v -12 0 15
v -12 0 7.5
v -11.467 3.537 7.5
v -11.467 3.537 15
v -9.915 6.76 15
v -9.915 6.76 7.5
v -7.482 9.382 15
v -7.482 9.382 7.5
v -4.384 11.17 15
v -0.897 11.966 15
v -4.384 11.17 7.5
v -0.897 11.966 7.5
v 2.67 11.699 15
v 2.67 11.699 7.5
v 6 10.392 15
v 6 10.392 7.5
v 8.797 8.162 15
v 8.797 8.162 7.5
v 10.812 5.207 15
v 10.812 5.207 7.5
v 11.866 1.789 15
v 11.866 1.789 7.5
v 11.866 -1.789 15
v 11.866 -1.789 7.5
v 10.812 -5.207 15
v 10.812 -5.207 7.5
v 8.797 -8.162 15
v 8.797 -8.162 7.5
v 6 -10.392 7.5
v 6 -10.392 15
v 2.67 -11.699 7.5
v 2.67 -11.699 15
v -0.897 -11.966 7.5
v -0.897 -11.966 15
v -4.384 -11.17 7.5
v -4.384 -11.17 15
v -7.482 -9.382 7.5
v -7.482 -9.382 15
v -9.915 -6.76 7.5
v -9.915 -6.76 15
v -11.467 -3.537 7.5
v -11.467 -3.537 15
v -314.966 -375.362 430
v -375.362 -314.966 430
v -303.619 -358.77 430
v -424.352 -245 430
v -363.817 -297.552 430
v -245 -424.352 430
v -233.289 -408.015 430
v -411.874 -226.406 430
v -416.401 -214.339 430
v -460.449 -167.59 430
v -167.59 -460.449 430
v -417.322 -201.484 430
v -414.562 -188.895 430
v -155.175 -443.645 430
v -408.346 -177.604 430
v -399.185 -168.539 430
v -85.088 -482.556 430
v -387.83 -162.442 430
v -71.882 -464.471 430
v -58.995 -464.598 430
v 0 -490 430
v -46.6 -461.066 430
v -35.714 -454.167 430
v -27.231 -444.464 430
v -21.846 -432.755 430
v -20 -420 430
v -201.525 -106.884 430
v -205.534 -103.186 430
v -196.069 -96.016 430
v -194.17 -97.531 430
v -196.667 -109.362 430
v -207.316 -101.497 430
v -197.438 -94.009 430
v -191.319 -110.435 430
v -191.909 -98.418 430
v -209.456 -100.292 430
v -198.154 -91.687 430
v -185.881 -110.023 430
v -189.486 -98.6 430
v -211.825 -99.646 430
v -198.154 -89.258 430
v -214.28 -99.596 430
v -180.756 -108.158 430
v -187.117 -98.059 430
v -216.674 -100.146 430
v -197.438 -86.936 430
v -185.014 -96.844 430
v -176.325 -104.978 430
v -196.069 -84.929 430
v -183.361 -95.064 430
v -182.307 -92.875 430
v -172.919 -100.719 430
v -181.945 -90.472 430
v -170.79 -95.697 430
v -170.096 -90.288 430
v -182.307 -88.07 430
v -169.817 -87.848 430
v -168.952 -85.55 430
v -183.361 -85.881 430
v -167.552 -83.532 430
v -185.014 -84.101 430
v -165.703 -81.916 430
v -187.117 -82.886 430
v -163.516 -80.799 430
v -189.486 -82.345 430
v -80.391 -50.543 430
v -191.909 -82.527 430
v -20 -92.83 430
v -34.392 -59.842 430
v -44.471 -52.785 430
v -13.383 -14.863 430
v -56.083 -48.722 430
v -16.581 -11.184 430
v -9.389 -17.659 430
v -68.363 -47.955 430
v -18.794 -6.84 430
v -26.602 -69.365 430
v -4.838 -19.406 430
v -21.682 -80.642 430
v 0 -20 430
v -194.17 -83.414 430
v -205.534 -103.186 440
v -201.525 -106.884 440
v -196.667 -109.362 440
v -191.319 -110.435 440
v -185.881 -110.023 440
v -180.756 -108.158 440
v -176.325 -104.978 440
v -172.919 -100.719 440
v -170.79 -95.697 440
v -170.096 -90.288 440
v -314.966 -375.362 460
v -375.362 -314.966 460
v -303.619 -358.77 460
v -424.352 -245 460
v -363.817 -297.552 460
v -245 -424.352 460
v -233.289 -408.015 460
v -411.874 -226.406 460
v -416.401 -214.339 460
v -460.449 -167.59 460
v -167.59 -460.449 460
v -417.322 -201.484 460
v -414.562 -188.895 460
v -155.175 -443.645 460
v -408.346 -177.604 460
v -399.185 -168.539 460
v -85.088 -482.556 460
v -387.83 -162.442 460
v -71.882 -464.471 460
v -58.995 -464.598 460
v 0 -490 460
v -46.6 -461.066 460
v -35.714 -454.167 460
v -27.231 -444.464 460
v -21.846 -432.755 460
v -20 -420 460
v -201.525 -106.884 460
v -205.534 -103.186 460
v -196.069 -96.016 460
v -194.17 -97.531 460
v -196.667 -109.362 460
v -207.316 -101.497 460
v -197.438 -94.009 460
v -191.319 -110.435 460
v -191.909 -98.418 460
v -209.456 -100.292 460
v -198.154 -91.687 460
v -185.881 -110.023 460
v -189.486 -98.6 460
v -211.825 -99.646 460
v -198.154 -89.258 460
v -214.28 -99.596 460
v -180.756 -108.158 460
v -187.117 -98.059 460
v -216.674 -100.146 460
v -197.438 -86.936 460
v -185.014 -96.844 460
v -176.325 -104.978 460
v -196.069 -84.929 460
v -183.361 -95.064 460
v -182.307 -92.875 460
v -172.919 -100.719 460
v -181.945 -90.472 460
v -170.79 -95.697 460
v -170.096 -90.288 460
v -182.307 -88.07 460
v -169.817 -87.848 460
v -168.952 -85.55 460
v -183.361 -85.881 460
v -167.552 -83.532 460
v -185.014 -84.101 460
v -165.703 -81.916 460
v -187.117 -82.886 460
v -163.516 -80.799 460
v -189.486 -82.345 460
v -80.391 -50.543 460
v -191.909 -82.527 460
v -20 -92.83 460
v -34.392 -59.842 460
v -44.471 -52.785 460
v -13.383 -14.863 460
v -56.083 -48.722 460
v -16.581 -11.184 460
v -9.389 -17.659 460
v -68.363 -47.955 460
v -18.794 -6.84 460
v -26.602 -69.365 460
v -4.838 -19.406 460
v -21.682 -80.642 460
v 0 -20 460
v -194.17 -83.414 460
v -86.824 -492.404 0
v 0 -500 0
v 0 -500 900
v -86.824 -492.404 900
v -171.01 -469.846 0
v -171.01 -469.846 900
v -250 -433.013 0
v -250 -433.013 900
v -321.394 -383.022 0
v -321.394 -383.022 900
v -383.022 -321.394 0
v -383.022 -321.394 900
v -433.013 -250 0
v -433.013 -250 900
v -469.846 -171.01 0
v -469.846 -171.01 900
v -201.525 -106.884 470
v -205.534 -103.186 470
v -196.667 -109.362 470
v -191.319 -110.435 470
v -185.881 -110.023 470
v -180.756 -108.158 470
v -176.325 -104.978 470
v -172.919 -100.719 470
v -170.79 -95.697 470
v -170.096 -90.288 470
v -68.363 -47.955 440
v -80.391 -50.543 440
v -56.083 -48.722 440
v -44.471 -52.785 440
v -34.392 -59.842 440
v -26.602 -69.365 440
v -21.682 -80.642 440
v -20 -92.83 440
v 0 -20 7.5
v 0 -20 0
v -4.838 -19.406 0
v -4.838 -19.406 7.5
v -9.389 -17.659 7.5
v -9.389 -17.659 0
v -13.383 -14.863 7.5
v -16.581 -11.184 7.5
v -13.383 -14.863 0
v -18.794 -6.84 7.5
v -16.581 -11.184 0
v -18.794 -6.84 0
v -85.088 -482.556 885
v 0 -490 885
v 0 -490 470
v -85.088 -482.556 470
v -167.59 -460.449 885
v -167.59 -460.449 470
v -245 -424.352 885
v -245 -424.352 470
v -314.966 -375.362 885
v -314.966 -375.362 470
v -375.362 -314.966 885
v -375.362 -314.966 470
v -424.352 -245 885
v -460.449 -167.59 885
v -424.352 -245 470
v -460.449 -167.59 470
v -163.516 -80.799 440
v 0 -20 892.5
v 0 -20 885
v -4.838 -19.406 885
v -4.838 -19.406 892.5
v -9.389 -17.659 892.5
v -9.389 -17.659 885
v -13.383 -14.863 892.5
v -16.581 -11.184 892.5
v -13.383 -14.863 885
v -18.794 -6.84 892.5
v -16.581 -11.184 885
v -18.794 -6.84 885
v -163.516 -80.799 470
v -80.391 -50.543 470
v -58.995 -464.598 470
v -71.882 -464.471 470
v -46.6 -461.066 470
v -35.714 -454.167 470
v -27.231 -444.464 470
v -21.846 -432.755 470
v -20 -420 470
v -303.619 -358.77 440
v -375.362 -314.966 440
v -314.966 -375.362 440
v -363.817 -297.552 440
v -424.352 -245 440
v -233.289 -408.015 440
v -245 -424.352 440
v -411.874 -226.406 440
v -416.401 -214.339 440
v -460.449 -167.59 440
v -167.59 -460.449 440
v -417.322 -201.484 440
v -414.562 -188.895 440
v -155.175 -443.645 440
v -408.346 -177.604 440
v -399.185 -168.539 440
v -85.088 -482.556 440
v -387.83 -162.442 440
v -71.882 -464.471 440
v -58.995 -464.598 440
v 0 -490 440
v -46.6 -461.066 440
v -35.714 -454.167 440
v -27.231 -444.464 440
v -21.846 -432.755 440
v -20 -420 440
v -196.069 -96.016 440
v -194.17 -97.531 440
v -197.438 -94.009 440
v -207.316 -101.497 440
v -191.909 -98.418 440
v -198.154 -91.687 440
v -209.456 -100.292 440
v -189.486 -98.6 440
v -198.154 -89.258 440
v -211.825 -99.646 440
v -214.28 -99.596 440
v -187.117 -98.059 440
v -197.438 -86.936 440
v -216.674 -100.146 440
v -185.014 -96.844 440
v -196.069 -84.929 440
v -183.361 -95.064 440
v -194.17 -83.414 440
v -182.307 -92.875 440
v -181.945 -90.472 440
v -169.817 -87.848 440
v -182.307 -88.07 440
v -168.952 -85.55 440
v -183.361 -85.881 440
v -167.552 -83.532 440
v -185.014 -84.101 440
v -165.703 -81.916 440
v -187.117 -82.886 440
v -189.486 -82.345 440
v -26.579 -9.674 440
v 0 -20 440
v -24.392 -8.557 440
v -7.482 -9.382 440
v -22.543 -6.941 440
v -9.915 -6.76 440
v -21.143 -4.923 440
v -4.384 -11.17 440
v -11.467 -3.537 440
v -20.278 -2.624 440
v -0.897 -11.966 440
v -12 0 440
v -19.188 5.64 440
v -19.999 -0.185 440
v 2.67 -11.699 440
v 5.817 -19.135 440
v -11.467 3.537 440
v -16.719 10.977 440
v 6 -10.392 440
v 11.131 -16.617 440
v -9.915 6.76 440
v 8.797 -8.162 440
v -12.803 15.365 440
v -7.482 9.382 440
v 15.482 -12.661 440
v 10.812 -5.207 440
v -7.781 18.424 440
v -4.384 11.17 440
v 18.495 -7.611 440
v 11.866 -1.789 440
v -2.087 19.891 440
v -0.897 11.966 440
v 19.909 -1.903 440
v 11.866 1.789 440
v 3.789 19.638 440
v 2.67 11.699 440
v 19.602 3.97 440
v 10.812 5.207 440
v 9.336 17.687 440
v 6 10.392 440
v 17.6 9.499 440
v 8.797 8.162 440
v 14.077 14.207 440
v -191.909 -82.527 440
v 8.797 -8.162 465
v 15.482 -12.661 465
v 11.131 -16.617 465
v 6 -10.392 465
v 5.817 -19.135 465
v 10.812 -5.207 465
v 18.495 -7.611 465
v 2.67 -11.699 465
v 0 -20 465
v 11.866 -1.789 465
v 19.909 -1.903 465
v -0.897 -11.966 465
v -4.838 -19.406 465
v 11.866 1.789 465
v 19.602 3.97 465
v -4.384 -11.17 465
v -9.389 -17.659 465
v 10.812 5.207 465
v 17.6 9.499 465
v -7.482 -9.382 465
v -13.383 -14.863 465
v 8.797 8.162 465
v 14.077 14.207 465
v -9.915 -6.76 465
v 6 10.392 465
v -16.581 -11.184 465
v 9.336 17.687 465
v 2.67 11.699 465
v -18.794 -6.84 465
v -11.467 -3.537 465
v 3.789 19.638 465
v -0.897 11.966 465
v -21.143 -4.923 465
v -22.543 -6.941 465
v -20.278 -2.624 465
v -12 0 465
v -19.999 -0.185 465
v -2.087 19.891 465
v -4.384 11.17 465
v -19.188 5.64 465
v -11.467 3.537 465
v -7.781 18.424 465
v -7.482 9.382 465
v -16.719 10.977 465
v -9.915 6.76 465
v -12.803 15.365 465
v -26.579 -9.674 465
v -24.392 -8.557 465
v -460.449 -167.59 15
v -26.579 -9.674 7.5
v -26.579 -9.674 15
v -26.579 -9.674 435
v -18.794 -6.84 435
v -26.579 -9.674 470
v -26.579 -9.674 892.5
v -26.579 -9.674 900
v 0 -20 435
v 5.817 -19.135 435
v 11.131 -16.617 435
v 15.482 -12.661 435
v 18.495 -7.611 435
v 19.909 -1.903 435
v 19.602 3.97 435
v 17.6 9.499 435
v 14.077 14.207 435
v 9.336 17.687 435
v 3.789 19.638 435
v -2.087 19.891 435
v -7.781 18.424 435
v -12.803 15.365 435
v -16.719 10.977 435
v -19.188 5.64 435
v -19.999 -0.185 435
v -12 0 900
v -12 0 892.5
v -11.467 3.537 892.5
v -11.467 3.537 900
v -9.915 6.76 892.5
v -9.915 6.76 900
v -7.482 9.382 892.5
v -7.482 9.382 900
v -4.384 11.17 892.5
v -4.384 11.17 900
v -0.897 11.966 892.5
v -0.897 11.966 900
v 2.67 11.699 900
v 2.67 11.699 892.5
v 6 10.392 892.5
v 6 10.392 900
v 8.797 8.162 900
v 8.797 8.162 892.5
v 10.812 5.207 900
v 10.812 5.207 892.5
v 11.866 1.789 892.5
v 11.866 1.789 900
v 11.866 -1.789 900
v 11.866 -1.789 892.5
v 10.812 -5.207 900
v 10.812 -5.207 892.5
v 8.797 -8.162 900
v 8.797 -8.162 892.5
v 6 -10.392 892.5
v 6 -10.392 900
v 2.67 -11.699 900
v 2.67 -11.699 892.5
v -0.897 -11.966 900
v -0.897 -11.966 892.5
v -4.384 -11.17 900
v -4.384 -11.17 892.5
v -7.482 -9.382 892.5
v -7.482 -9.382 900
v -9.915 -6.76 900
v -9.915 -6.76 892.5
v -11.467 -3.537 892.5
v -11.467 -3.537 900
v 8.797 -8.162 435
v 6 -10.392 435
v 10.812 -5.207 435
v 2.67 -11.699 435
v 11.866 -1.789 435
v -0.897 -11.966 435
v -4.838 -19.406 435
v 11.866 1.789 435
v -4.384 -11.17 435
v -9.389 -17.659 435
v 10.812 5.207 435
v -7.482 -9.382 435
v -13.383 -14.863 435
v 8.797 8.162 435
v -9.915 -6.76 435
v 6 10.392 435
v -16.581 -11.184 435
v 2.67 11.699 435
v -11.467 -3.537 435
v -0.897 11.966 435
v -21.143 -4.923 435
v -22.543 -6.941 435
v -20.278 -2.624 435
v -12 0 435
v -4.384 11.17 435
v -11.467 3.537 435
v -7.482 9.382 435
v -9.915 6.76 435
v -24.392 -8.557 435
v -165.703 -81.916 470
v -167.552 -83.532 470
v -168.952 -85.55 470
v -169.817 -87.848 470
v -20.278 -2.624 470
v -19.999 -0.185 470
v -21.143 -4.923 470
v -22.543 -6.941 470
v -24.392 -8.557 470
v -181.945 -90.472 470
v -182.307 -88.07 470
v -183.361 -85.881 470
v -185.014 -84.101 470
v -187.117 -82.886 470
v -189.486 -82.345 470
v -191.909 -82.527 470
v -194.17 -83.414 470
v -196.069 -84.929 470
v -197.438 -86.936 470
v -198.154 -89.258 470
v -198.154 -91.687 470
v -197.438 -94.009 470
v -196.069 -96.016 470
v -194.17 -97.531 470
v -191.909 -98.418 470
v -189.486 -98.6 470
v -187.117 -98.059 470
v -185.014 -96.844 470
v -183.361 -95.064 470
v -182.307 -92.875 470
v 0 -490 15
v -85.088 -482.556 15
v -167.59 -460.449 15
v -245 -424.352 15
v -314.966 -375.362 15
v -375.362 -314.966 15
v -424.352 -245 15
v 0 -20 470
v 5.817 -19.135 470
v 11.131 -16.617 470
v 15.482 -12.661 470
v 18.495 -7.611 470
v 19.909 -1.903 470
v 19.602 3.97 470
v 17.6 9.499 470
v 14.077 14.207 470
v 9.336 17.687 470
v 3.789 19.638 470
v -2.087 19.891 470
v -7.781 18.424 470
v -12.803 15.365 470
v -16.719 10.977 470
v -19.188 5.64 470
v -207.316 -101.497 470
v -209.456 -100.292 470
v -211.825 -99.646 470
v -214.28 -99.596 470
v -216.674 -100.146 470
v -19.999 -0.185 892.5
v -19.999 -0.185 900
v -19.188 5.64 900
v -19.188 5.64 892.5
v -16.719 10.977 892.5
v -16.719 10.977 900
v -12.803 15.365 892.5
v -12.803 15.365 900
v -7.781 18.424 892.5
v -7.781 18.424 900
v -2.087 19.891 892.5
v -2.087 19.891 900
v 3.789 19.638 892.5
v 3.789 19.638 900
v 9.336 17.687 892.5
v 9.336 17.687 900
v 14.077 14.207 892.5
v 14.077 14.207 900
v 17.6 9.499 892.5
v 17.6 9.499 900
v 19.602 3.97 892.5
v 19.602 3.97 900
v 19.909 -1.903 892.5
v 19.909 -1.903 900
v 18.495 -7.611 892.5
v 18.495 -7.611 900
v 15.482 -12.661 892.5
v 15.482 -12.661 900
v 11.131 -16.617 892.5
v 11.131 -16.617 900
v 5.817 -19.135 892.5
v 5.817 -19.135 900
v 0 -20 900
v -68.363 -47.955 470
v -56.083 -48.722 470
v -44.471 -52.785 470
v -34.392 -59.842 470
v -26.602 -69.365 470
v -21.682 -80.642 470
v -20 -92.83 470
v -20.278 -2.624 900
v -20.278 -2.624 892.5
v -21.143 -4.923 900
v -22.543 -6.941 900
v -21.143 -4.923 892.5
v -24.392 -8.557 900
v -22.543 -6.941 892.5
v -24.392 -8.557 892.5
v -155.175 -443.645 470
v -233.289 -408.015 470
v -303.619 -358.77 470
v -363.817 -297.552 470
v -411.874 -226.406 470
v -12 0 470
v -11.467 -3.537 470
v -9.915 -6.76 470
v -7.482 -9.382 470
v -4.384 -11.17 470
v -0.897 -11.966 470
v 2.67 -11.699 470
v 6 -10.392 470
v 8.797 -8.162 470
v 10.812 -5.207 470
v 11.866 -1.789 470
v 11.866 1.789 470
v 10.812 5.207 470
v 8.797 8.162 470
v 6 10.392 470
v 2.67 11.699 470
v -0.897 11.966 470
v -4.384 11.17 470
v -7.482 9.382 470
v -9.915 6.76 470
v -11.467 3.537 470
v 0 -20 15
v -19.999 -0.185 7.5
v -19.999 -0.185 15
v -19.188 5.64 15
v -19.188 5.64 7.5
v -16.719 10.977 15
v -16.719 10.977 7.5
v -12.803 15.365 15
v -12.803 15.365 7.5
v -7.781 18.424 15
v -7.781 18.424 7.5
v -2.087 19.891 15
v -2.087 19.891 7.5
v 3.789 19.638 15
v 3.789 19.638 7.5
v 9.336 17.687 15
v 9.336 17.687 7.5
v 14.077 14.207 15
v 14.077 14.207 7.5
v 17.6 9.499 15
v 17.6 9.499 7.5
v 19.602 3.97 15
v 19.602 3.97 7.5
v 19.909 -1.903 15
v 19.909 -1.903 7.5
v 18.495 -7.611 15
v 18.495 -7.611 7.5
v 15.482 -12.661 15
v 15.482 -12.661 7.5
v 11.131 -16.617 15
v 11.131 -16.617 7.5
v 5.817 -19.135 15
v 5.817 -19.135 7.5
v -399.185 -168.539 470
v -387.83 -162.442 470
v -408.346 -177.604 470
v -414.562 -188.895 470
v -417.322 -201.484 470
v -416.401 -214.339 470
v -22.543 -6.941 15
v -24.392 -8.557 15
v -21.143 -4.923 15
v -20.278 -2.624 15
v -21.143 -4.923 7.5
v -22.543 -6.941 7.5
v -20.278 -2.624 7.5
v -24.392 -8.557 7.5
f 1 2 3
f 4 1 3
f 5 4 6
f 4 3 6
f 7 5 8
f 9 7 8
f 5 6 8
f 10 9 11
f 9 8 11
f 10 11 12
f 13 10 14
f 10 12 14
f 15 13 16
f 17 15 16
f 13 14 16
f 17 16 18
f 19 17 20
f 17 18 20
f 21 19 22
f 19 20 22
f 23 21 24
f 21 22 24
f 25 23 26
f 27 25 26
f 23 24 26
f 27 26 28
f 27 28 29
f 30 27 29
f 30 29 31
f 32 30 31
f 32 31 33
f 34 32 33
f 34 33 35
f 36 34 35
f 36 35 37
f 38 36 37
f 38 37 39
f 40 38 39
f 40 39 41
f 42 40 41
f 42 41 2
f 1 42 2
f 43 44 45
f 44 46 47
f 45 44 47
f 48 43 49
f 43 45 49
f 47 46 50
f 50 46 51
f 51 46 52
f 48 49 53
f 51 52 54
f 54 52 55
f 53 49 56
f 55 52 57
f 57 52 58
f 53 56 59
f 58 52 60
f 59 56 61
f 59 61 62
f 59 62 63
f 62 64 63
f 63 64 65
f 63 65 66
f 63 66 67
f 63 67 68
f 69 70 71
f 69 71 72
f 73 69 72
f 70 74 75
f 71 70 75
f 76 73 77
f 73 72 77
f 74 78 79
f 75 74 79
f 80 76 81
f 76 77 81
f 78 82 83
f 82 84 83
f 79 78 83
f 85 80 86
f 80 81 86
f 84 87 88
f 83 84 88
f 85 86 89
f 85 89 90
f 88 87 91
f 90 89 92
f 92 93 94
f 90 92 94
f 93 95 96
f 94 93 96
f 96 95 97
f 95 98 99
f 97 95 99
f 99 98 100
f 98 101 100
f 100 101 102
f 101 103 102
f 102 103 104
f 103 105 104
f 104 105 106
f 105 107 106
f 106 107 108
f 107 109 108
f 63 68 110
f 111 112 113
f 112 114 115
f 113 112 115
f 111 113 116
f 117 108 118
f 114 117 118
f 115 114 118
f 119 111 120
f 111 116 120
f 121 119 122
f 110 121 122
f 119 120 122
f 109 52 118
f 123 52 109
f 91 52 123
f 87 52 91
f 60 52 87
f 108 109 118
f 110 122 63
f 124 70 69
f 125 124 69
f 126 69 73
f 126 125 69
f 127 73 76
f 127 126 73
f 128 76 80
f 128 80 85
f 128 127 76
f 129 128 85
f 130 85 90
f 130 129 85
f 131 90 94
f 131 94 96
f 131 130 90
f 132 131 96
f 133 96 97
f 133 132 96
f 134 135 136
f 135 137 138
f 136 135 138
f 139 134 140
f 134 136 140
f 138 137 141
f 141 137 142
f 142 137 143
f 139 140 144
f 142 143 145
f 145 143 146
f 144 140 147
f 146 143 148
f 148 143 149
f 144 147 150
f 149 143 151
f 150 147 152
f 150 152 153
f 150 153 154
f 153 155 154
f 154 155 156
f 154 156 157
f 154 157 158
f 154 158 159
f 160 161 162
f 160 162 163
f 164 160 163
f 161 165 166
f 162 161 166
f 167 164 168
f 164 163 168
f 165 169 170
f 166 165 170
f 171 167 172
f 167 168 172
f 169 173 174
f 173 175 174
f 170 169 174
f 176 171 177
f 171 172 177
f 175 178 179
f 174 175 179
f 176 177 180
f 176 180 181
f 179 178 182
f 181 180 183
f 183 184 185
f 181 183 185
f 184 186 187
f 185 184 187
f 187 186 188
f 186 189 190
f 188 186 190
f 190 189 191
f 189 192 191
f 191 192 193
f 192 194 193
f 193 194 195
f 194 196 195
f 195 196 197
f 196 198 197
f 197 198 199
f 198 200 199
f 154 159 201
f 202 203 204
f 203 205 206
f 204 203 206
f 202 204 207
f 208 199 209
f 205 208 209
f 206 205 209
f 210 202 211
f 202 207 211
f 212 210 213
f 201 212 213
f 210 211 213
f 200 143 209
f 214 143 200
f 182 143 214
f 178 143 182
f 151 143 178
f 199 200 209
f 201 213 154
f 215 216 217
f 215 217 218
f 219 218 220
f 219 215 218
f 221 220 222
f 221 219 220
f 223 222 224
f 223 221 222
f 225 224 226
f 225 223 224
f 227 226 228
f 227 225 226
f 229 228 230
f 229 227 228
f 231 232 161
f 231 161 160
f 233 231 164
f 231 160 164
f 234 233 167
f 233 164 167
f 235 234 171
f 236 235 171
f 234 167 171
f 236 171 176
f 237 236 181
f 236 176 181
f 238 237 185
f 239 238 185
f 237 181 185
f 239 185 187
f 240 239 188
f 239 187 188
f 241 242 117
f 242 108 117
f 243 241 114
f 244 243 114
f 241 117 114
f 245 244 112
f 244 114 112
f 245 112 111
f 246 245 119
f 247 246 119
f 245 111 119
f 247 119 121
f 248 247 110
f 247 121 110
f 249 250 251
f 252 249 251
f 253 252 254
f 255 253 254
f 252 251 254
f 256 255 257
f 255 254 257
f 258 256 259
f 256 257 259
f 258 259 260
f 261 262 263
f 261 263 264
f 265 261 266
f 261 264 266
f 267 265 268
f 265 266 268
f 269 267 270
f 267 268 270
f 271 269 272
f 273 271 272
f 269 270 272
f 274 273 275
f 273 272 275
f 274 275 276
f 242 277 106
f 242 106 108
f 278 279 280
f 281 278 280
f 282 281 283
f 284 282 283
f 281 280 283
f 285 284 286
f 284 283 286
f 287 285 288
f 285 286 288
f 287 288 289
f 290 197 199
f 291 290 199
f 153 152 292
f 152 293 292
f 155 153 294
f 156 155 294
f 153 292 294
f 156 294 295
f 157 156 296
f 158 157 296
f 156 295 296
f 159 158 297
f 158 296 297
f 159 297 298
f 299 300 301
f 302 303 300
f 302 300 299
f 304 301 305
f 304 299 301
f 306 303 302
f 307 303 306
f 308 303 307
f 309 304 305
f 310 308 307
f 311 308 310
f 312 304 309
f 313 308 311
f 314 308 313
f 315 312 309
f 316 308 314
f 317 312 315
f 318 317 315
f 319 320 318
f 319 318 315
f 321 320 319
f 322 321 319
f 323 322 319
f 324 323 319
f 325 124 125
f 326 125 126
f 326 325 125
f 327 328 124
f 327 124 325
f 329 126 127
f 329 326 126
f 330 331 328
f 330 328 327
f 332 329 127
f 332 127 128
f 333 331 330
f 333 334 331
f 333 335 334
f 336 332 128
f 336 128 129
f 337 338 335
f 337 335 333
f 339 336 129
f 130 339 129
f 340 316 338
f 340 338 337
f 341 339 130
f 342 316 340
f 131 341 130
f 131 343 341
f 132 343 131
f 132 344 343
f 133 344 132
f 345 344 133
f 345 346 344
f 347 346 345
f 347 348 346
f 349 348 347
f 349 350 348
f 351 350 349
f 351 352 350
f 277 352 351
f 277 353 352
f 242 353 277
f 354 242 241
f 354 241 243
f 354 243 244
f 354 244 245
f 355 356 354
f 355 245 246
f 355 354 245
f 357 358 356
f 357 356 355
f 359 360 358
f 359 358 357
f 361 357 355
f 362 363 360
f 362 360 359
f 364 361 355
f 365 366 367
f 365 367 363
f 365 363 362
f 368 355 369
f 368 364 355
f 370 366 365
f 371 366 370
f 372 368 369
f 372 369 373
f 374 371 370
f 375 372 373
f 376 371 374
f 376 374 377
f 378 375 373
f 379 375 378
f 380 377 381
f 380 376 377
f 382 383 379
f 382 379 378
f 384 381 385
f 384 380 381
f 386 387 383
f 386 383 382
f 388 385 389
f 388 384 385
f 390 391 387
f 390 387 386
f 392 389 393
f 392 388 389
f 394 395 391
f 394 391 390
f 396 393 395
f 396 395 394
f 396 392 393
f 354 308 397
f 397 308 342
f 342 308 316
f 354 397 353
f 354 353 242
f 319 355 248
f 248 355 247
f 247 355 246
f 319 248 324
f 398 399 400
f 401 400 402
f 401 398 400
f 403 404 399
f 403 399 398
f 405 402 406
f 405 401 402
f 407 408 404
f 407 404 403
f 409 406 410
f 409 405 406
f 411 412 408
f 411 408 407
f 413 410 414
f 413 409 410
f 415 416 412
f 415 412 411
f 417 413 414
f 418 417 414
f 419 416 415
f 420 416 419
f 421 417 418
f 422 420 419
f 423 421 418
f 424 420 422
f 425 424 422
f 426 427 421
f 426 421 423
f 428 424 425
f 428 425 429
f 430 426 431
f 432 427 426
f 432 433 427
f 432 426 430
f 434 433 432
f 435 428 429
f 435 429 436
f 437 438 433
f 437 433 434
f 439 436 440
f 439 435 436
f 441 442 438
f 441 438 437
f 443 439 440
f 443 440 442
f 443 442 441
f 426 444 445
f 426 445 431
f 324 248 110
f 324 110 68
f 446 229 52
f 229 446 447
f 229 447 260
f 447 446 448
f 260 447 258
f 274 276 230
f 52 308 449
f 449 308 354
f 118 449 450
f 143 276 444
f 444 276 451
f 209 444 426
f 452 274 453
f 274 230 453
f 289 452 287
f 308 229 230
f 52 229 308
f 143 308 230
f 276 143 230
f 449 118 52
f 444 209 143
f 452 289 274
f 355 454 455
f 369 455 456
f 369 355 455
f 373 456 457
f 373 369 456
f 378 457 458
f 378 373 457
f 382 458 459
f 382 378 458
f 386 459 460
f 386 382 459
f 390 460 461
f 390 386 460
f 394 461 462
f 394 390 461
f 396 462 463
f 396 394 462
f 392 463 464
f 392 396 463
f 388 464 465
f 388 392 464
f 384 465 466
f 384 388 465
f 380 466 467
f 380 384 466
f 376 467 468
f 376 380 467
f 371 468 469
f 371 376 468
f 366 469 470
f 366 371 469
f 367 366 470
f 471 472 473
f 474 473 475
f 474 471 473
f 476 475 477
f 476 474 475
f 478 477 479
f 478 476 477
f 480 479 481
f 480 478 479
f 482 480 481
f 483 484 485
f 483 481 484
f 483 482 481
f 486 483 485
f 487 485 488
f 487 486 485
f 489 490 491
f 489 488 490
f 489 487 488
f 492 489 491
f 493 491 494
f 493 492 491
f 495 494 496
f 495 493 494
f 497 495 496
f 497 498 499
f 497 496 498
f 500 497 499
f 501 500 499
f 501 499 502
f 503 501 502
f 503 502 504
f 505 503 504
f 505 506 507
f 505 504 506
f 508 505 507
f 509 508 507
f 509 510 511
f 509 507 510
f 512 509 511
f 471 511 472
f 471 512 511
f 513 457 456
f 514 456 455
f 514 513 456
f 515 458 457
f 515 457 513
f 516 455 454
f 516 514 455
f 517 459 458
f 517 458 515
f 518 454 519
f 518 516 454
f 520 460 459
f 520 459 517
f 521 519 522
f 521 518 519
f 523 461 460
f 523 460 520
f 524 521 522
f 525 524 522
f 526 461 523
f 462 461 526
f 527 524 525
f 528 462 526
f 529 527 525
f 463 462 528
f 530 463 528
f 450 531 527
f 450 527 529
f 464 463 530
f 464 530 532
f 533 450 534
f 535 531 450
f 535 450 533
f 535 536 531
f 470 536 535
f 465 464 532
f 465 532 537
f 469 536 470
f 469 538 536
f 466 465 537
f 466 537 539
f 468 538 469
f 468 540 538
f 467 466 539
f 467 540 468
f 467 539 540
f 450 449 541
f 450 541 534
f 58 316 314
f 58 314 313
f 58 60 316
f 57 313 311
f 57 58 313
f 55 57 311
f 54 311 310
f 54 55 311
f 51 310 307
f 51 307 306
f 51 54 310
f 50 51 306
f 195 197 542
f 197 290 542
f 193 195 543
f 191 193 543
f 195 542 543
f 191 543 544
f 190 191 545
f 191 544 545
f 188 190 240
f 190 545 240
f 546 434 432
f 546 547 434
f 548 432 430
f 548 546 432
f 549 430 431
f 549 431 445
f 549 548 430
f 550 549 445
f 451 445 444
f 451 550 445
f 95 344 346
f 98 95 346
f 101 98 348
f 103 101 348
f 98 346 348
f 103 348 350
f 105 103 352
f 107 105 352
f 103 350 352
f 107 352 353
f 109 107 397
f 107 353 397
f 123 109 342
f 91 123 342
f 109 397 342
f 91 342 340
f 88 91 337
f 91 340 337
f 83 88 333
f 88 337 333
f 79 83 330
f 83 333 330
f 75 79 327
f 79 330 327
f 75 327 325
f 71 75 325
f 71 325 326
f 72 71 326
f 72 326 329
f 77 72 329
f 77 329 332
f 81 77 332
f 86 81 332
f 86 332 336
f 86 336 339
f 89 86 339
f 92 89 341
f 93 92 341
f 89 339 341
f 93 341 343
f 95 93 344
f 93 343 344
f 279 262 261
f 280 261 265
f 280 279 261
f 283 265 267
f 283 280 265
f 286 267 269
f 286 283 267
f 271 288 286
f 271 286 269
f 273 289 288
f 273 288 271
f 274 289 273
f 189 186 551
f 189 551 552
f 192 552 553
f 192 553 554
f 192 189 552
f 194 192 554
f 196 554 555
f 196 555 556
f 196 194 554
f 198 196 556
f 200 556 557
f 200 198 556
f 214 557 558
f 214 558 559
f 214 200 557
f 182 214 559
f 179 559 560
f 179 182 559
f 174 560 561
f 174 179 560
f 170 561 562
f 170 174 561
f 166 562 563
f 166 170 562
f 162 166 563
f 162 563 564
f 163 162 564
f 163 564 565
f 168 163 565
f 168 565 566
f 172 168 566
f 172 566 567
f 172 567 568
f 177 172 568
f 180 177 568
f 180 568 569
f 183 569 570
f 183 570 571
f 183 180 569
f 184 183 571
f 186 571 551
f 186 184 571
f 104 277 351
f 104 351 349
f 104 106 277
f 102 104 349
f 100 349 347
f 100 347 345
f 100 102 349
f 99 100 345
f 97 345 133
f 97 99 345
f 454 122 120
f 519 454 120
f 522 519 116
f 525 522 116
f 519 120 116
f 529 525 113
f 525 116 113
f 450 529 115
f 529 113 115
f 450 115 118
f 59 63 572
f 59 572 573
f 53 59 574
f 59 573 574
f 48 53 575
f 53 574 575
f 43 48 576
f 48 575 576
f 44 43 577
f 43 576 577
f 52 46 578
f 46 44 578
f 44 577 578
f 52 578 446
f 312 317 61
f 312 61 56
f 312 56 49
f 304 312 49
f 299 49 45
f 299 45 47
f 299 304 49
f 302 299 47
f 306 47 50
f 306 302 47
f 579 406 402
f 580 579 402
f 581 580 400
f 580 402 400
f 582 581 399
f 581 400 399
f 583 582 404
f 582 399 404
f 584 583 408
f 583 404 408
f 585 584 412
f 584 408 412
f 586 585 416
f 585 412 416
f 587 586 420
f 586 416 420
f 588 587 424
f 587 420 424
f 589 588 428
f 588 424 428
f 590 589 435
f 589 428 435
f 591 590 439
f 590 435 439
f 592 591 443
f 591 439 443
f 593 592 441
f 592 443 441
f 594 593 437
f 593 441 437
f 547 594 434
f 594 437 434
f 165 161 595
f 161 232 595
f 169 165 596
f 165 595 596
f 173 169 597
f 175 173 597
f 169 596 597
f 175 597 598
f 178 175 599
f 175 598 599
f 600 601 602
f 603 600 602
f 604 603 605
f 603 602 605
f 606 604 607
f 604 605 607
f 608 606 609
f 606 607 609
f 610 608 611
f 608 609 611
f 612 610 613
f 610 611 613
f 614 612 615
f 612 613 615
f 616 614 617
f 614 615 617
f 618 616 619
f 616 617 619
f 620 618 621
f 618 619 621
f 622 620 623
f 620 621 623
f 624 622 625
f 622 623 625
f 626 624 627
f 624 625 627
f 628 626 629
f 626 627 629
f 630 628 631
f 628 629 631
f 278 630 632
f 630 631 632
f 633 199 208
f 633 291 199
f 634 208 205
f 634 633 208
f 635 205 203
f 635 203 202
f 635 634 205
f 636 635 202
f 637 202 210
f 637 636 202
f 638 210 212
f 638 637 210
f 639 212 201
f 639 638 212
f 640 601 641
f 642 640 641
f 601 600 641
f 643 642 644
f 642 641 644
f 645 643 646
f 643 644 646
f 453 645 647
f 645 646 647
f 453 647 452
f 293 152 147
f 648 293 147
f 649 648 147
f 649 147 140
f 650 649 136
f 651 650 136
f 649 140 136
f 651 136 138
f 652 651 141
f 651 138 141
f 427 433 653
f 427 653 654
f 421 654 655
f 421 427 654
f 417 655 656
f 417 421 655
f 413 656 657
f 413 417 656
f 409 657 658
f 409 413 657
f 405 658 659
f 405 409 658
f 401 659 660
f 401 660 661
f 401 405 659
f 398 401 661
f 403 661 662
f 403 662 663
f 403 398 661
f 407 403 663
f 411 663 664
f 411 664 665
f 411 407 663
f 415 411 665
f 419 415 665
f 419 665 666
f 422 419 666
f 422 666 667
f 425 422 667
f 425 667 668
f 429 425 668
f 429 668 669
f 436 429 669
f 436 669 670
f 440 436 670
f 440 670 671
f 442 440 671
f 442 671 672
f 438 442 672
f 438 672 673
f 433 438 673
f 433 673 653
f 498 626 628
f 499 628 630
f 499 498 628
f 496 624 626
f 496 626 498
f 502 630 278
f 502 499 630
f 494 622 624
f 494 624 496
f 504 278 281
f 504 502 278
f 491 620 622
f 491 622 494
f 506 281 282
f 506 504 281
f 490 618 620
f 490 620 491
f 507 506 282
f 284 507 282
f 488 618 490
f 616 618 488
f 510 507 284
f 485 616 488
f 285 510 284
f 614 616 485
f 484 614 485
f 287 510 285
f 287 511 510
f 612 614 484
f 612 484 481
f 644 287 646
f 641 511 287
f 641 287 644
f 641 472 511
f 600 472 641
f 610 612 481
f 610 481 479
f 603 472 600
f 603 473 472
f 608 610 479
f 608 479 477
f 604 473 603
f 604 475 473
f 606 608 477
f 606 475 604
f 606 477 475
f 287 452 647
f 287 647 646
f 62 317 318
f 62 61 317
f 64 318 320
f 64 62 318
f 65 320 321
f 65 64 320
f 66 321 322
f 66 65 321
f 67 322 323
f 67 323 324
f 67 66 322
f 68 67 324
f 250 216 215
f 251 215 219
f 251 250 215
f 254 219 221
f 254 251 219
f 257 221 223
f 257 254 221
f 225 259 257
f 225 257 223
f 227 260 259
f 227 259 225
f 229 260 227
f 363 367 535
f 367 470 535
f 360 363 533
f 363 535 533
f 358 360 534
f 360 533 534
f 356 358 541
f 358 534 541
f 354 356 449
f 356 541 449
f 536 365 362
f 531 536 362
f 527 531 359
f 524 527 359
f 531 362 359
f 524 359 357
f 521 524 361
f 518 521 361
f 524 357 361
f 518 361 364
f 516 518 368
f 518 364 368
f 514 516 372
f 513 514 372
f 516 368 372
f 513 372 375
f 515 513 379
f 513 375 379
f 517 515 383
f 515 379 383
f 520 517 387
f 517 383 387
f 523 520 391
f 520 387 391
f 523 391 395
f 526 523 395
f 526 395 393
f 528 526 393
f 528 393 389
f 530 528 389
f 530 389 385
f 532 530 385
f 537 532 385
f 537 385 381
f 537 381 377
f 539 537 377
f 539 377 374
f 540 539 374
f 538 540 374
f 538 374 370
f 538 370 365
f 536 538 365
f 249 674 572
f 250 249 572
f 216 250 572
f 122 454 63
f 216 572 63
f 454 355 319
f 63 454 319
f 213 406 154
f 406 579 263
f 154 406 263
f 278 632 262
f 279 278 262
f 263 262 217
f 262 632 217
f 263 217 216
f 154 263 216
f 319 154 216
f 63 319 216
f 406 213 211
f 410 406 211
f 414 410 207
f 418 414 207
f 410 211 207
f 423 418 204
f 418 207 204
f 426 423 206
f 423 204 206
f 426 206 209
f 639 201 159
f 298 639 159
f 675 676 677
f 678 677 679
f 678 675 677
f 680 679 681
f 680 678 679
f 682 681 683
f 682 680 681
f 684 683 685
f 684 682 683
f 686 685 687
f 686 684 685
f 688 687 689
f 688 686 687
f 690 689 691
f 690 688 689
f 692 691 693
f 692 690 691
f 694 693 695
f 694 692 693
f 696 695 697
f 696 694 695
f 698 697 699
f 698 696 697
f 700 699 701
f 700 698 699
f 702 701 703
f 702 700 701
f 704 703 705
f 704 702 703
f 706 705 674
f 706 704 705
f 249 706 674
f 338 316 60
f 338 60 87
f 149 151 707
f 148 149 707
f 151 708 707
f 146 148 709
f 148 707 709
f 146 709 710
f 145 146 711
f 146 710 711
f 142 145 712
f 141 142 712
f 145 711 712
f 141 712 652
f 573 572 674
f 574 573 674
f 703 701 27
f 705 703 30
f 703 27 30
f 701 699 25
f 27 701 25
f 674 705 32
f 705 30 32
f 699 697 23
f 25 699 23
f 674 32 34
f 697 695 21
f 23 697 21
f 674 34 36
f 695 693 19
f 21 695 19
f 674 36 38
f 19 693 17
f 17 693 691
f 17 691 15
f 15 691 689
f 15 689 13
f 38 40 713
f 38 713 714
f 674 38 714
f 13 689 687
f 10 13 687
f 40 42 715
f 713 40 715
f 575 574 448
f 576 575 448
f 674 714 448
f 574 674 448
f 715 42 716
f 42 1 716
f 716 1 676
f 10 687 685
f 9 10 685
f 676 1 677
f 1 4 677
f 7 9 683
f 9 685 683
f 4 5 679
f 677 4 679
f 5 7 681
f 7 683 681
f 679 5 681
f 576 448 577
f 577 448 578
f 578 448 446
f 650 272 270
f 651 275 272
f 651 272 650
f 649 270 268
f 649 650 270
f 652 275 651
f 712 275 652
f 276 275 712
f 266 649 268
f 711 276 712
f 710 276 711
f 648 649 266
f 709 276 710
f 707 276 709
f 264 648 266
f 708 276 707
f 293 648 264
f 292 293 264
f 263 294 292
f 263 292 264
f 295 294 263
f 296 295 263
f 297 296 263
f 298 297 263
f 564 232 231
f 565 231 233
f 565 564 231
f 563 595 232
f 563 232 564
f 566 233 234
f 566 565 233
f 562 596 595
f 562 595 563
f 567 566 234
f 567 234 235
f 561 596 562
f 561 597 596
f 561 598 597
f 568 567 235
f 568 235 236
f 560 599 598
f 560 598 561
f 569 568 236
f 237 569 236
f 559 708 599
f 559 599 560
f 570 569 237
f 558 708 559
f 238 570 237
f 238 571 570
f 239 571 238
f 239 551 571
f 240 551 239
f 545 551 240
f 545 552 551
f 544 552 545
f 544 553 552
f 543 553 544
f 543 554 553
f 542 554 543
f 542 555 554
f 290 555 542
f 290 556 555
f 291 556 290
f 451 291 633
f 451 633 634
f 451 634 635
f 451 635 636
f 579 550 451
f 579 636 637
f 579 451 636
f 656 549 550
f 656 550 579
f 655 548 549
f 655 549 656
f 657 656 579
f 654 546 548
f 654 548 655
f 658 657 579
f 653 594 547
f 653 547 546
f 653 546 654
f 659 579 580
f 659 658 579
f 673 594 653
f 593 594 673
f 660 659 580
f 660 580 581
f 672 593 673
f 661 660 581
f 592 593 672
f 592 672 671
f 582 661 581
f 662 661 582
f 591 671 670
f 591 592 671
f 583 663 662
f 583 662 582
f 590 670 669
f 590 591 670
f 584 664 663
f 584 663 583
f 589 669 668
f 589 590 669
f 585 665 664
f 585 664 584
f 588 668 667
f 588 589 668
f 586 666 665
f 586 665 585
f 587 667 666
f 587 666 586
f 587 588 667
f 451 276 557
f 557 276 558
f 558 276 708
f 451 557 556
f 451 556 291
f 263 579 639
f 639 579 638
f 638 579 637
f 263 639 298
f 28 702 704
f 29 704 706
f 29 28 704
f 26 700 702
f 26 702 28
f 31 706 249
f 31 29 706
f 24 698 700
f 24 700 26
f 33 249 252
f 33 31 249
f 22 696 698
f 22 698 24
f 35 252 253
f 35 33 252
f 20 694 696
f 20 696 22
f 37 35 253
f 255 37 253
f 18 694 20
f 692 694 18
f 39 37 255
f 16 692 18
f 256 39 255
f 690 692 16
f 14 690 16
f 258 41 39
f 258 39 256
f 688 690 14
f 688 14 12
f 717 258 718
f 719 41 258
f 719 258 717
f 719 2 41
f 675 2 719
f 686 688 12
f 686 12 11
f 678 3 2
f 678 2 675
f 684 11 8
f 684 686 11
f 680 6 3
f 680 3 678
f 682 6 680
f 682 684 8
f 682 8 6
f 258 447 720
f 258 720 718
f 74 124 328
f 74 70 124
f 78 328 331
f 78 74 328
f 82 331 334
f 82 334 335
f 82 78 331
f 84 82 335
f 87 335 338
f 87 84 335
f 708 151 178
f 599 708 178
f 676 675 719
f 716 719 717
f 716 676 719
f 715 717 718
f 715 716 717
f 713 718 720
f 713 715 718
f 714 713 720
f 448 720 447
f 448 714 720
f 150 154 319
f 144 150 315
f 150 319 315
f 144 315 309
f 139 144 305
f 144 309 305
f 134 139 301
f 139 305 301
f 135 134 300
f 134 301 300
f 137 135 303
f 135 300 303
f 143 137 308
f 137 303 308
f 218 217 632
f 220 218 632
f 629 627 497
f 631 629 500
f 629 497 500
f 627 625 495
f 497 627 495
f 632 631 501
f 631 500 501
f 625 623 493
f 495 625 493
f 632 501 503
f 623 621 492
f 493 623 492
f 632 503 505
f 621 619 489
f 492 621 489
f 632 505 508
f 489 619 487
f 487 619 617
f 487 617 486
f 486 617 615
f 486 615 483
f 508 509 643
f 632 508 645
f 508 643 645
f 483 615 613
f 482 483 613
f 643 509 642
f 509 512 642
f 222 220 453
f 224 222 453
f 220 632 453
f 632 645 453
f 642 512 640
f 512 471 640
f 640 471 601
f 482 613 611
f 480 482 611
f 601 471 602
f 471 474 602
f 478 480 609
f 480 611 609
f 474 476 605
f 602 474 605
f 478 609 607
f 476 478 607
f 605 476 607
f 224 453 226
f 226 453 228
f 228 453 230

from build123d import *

# Parameters (mm, degrees)
DODANIE_WYCI_GNI_CIE1_DEPTH = 900
SKORUPA1_T                  = -10
SZKIC4_R                    = 12
DODANIE_WYCI_GNI_CIE3_DEPTH = 15
SZKIC6_R                    = 12
SZKIC6_R_2                  = 8.15
DODANIE_WYCI_GNI_CIE4_DEPTH = 10
ZAOKR_GLENIE3_R             = 45
SZKIC8_R                    = 20
WYTNIJ_WYCI_GNI_CIE1_DEPTH  = 7.5
SZKIC11_R                   = 20
WYTNIJ_WYCI_GNI_CIE2_DEPTH  = 5
SZKIC12_R                   = 20
WYTNIJ_WYCI_GNI_CIE3_DEPTH  = 5
SZKIC13_R                   = 20
WYTNIJ_WYCI_GNI_CIE4_DEPTH  = 7.5
ZAOKR_GLENIE4_R             = 10
ZAOKR_GLENIE5_R             = 10


with BuildPart() as part:
    # Szkic1 → Dodanie-wyciągnięcie1 (new body)
    with BuildSketch(Plane.XY):
        with BuildLine():
            Line((-469.846310393, -171.010071663), (0, 0))
            Line((0, 0), (0, -500))
            ThreePointArc((0, -500), (-286.788218176, -409.576022144), (-469.846310393, -171.010071663))
        make_face()
    extrude(amount=DODANIE_WYCI_GNI_CIE1_DEPTH)

    # Skorupa1
    skorupa1_openings = [part.faces().sort_by_distance(p)[0] for p in [
        (-179.521279962, -256.382958146, 900),
        (-179.521279962, -256.382958146, 0),
        (-234.923155196, -85.505035831, 450),
        (0, -250, 450),
    ]]
    offset(amount=SKORUPA1_T, openings=skorupa1_openings, kind=Kind.INTERSECTION)

    # Szkic4 → Dodanie-wyciągnięcie3 (add)
    with BuildSketch(Plane(origin=(0, 0, 0), x_dir=(-1, 0, 0), z_dir=(0, 0, -1))):
        with BuildLine():
            Line((0, -20), (0, -490))
            ThreePointArc((0, -490), (281.052453812, -401.384501702), (460.449384185, -167.58987023))
            Line((460.449384185, -167.58987023), (18.793852416, -6.840402867))
            ThreePointArc((18.793852416, -6.840402867), (-11.471528727, 16.383040886), (0, -20))
        make_face()
        Circle(SZKIC4_R, mode=Mode.SUBTRACT)
    dodanie_wyci_gni_cie3 = extrude(amount=-DODANIE_WYCI_GNI_CIE3_DEPTH)

    # Lustro1: Dodanie-wyciągnięcie3 across plane
    add(dodanie_wyci_gni_cie3.mirror(Plane.XY.offset(450)))

    # Szkic6 → Dodanie-wyciągnięcie4 (add)
    with BuildSketch(Plane.XY.offset(440)):
        with BuildLine():
            Line((-18.793852416, -6.840402867), (-460.449384185, -167.58987023))
            ThreePointArc((-460.449384185, -167.58987023), (-281.052453812, -401.384501702), (0, -490))
            Line((0, -490), (0, -20))
            ThreePointArc((0, -20), (11.471528727, 16.383040886), (-18.793852416, -6.840402867))
        make_face()
        with Locations(Location((0, 0, 0), (0, 0, 180))):
            Circle(SZKIC6_R, mode=Mode.SUBTRACT)
        with Locations((-190.094997116, -90.472476083)):
            Circle(SZKIC6_R_2, mode=Mode.SUBTRACT)
        with BuildLine():
            Line((-20, -28.562960135), (-20, -469.574275275))
            ThreePointArc((-20, -469.574275275), (-269.580925085, -385.001460816), (-434.41507852, -179.397713347))
            Line((-434.41507852, -179.397713347), (-208.888849532, -97.312878949))
            ThreePointArc((-208.888849532, -97.312878949), (-183.254594249, -109.266328498), (-171.3011447, -83.632073216))
            Line((-171.3011447, -83.632073216), (-20, -28.562960135))
        make_face(mode=Mode.SUBTRACT)
    dodanie_wyci_gni_cie4 = extrude(amount=-DODANIE_WYCI_GNI_CIE4_DEPTH)

    # Lustro6: Dodanie-wyciągnięcie4 across plane
    add(dodanie_wyci_gni_cie4.mirror(Plane.XY.offset(450)))

    # Zaokrąglenie3
    zaokr_glenie3_edges = [part.edges().sort_by_distance(p)[0] for p in [
        (-434.41507852, -179.397713347, 435),
        (-20, -28.562960135, 435),
        (-20, -469.574275275, 435),
        (-20, -469.574275275, 465),
        (-20, -28.562960135, 465),
        (-434.41507852, -179.397713347, 465),
    ]]
    fillet(zaokr_glenie3_edges, radius=ZAOKR_GLENIE3_R)

    # Szkic8 → Wytnij-wyciągnięcie1 (cut)
    with BuildSketch(Plane(origin=(0, 0, 0), x_dir=(-1, 0, 0), z_dir=(0, 0, -1))):
        Circle(SZKIC8_R)
    extrude(amount=-WYTNIJ_WYCI_GNI_CIE1_DEPTH, mode=Mode.SUBTRACT)

    # Szkic11 → Wytnij-wyciągnięcie2 (cut)
    with BuildSketch(Plane(origin=(0, 0, 430), x_dir=(-1, 0, 0), z_dir=(0, 0, -1))):
        Circle(SZKIC11_R)
    extrude(amount=-WYTNIJ_WYCI_GNI_CIE2_DEPTH, mode=Mode.SUBTRACT)

    # Szkic12 → Wytnij-wyciągnięcie3 (cut)
    with BuildSketch(Plane(origin=(0, 0, 460), x_dir=(-1, 0, 0), z_dir=(0, 0, -1))):
        Circle(SZKIC12_R)
    extrude(amount=-WYTNIJ_WYCI_GNI_CIE3_DEPTH, mode=Mode.SUBTRACT)

    # Szkic13 → Wytnij-wyciągnięcie4 (cut)
    with BuildSketch(Plane(origin=(0, 0, 885), x_dir=(-1, 0, 0), z_dir=(0, 0, -1))):
        Circle(SZKIC13_R)
    extrude(amount=-WYTNIJ_WYCI_GNI_CIE4_DEPTH, mode=Mode.SUBTRACT)

    # Zaokrąglenie4
    zaokr_glenie4_edges = [part.edges().sort_by_distance(p)[0] for p in [
        (-18.793852416, -6.840402867, 437.5),
        (-18.793852416, -6.840402867, 896.25),
        (-18.793852416, -6.840402867, 11.25),
        (-18.793852416, -6.840402867, 467.5),
    ]]
    fillet(zaokr_glenie4_edges, radius=ZAOKR_GLENIE4_R)

    # Zaokrąglenie5
    zaokr_glenie5_edges = [part.edges().sort_by_distance(p)[0] for p in [
        (-208.888849532, -97.312878949, 435),
        (-171.3011447, -83.632073216, 435),
        (-171.3011447, -83.632073216, 465),
        (-208.888849532, -97.312878949, 465),
    ]]
    fillet(zaokr_glenie5_edges, radius=ZAOKR_GLENIE5_R)


solid = part.part
